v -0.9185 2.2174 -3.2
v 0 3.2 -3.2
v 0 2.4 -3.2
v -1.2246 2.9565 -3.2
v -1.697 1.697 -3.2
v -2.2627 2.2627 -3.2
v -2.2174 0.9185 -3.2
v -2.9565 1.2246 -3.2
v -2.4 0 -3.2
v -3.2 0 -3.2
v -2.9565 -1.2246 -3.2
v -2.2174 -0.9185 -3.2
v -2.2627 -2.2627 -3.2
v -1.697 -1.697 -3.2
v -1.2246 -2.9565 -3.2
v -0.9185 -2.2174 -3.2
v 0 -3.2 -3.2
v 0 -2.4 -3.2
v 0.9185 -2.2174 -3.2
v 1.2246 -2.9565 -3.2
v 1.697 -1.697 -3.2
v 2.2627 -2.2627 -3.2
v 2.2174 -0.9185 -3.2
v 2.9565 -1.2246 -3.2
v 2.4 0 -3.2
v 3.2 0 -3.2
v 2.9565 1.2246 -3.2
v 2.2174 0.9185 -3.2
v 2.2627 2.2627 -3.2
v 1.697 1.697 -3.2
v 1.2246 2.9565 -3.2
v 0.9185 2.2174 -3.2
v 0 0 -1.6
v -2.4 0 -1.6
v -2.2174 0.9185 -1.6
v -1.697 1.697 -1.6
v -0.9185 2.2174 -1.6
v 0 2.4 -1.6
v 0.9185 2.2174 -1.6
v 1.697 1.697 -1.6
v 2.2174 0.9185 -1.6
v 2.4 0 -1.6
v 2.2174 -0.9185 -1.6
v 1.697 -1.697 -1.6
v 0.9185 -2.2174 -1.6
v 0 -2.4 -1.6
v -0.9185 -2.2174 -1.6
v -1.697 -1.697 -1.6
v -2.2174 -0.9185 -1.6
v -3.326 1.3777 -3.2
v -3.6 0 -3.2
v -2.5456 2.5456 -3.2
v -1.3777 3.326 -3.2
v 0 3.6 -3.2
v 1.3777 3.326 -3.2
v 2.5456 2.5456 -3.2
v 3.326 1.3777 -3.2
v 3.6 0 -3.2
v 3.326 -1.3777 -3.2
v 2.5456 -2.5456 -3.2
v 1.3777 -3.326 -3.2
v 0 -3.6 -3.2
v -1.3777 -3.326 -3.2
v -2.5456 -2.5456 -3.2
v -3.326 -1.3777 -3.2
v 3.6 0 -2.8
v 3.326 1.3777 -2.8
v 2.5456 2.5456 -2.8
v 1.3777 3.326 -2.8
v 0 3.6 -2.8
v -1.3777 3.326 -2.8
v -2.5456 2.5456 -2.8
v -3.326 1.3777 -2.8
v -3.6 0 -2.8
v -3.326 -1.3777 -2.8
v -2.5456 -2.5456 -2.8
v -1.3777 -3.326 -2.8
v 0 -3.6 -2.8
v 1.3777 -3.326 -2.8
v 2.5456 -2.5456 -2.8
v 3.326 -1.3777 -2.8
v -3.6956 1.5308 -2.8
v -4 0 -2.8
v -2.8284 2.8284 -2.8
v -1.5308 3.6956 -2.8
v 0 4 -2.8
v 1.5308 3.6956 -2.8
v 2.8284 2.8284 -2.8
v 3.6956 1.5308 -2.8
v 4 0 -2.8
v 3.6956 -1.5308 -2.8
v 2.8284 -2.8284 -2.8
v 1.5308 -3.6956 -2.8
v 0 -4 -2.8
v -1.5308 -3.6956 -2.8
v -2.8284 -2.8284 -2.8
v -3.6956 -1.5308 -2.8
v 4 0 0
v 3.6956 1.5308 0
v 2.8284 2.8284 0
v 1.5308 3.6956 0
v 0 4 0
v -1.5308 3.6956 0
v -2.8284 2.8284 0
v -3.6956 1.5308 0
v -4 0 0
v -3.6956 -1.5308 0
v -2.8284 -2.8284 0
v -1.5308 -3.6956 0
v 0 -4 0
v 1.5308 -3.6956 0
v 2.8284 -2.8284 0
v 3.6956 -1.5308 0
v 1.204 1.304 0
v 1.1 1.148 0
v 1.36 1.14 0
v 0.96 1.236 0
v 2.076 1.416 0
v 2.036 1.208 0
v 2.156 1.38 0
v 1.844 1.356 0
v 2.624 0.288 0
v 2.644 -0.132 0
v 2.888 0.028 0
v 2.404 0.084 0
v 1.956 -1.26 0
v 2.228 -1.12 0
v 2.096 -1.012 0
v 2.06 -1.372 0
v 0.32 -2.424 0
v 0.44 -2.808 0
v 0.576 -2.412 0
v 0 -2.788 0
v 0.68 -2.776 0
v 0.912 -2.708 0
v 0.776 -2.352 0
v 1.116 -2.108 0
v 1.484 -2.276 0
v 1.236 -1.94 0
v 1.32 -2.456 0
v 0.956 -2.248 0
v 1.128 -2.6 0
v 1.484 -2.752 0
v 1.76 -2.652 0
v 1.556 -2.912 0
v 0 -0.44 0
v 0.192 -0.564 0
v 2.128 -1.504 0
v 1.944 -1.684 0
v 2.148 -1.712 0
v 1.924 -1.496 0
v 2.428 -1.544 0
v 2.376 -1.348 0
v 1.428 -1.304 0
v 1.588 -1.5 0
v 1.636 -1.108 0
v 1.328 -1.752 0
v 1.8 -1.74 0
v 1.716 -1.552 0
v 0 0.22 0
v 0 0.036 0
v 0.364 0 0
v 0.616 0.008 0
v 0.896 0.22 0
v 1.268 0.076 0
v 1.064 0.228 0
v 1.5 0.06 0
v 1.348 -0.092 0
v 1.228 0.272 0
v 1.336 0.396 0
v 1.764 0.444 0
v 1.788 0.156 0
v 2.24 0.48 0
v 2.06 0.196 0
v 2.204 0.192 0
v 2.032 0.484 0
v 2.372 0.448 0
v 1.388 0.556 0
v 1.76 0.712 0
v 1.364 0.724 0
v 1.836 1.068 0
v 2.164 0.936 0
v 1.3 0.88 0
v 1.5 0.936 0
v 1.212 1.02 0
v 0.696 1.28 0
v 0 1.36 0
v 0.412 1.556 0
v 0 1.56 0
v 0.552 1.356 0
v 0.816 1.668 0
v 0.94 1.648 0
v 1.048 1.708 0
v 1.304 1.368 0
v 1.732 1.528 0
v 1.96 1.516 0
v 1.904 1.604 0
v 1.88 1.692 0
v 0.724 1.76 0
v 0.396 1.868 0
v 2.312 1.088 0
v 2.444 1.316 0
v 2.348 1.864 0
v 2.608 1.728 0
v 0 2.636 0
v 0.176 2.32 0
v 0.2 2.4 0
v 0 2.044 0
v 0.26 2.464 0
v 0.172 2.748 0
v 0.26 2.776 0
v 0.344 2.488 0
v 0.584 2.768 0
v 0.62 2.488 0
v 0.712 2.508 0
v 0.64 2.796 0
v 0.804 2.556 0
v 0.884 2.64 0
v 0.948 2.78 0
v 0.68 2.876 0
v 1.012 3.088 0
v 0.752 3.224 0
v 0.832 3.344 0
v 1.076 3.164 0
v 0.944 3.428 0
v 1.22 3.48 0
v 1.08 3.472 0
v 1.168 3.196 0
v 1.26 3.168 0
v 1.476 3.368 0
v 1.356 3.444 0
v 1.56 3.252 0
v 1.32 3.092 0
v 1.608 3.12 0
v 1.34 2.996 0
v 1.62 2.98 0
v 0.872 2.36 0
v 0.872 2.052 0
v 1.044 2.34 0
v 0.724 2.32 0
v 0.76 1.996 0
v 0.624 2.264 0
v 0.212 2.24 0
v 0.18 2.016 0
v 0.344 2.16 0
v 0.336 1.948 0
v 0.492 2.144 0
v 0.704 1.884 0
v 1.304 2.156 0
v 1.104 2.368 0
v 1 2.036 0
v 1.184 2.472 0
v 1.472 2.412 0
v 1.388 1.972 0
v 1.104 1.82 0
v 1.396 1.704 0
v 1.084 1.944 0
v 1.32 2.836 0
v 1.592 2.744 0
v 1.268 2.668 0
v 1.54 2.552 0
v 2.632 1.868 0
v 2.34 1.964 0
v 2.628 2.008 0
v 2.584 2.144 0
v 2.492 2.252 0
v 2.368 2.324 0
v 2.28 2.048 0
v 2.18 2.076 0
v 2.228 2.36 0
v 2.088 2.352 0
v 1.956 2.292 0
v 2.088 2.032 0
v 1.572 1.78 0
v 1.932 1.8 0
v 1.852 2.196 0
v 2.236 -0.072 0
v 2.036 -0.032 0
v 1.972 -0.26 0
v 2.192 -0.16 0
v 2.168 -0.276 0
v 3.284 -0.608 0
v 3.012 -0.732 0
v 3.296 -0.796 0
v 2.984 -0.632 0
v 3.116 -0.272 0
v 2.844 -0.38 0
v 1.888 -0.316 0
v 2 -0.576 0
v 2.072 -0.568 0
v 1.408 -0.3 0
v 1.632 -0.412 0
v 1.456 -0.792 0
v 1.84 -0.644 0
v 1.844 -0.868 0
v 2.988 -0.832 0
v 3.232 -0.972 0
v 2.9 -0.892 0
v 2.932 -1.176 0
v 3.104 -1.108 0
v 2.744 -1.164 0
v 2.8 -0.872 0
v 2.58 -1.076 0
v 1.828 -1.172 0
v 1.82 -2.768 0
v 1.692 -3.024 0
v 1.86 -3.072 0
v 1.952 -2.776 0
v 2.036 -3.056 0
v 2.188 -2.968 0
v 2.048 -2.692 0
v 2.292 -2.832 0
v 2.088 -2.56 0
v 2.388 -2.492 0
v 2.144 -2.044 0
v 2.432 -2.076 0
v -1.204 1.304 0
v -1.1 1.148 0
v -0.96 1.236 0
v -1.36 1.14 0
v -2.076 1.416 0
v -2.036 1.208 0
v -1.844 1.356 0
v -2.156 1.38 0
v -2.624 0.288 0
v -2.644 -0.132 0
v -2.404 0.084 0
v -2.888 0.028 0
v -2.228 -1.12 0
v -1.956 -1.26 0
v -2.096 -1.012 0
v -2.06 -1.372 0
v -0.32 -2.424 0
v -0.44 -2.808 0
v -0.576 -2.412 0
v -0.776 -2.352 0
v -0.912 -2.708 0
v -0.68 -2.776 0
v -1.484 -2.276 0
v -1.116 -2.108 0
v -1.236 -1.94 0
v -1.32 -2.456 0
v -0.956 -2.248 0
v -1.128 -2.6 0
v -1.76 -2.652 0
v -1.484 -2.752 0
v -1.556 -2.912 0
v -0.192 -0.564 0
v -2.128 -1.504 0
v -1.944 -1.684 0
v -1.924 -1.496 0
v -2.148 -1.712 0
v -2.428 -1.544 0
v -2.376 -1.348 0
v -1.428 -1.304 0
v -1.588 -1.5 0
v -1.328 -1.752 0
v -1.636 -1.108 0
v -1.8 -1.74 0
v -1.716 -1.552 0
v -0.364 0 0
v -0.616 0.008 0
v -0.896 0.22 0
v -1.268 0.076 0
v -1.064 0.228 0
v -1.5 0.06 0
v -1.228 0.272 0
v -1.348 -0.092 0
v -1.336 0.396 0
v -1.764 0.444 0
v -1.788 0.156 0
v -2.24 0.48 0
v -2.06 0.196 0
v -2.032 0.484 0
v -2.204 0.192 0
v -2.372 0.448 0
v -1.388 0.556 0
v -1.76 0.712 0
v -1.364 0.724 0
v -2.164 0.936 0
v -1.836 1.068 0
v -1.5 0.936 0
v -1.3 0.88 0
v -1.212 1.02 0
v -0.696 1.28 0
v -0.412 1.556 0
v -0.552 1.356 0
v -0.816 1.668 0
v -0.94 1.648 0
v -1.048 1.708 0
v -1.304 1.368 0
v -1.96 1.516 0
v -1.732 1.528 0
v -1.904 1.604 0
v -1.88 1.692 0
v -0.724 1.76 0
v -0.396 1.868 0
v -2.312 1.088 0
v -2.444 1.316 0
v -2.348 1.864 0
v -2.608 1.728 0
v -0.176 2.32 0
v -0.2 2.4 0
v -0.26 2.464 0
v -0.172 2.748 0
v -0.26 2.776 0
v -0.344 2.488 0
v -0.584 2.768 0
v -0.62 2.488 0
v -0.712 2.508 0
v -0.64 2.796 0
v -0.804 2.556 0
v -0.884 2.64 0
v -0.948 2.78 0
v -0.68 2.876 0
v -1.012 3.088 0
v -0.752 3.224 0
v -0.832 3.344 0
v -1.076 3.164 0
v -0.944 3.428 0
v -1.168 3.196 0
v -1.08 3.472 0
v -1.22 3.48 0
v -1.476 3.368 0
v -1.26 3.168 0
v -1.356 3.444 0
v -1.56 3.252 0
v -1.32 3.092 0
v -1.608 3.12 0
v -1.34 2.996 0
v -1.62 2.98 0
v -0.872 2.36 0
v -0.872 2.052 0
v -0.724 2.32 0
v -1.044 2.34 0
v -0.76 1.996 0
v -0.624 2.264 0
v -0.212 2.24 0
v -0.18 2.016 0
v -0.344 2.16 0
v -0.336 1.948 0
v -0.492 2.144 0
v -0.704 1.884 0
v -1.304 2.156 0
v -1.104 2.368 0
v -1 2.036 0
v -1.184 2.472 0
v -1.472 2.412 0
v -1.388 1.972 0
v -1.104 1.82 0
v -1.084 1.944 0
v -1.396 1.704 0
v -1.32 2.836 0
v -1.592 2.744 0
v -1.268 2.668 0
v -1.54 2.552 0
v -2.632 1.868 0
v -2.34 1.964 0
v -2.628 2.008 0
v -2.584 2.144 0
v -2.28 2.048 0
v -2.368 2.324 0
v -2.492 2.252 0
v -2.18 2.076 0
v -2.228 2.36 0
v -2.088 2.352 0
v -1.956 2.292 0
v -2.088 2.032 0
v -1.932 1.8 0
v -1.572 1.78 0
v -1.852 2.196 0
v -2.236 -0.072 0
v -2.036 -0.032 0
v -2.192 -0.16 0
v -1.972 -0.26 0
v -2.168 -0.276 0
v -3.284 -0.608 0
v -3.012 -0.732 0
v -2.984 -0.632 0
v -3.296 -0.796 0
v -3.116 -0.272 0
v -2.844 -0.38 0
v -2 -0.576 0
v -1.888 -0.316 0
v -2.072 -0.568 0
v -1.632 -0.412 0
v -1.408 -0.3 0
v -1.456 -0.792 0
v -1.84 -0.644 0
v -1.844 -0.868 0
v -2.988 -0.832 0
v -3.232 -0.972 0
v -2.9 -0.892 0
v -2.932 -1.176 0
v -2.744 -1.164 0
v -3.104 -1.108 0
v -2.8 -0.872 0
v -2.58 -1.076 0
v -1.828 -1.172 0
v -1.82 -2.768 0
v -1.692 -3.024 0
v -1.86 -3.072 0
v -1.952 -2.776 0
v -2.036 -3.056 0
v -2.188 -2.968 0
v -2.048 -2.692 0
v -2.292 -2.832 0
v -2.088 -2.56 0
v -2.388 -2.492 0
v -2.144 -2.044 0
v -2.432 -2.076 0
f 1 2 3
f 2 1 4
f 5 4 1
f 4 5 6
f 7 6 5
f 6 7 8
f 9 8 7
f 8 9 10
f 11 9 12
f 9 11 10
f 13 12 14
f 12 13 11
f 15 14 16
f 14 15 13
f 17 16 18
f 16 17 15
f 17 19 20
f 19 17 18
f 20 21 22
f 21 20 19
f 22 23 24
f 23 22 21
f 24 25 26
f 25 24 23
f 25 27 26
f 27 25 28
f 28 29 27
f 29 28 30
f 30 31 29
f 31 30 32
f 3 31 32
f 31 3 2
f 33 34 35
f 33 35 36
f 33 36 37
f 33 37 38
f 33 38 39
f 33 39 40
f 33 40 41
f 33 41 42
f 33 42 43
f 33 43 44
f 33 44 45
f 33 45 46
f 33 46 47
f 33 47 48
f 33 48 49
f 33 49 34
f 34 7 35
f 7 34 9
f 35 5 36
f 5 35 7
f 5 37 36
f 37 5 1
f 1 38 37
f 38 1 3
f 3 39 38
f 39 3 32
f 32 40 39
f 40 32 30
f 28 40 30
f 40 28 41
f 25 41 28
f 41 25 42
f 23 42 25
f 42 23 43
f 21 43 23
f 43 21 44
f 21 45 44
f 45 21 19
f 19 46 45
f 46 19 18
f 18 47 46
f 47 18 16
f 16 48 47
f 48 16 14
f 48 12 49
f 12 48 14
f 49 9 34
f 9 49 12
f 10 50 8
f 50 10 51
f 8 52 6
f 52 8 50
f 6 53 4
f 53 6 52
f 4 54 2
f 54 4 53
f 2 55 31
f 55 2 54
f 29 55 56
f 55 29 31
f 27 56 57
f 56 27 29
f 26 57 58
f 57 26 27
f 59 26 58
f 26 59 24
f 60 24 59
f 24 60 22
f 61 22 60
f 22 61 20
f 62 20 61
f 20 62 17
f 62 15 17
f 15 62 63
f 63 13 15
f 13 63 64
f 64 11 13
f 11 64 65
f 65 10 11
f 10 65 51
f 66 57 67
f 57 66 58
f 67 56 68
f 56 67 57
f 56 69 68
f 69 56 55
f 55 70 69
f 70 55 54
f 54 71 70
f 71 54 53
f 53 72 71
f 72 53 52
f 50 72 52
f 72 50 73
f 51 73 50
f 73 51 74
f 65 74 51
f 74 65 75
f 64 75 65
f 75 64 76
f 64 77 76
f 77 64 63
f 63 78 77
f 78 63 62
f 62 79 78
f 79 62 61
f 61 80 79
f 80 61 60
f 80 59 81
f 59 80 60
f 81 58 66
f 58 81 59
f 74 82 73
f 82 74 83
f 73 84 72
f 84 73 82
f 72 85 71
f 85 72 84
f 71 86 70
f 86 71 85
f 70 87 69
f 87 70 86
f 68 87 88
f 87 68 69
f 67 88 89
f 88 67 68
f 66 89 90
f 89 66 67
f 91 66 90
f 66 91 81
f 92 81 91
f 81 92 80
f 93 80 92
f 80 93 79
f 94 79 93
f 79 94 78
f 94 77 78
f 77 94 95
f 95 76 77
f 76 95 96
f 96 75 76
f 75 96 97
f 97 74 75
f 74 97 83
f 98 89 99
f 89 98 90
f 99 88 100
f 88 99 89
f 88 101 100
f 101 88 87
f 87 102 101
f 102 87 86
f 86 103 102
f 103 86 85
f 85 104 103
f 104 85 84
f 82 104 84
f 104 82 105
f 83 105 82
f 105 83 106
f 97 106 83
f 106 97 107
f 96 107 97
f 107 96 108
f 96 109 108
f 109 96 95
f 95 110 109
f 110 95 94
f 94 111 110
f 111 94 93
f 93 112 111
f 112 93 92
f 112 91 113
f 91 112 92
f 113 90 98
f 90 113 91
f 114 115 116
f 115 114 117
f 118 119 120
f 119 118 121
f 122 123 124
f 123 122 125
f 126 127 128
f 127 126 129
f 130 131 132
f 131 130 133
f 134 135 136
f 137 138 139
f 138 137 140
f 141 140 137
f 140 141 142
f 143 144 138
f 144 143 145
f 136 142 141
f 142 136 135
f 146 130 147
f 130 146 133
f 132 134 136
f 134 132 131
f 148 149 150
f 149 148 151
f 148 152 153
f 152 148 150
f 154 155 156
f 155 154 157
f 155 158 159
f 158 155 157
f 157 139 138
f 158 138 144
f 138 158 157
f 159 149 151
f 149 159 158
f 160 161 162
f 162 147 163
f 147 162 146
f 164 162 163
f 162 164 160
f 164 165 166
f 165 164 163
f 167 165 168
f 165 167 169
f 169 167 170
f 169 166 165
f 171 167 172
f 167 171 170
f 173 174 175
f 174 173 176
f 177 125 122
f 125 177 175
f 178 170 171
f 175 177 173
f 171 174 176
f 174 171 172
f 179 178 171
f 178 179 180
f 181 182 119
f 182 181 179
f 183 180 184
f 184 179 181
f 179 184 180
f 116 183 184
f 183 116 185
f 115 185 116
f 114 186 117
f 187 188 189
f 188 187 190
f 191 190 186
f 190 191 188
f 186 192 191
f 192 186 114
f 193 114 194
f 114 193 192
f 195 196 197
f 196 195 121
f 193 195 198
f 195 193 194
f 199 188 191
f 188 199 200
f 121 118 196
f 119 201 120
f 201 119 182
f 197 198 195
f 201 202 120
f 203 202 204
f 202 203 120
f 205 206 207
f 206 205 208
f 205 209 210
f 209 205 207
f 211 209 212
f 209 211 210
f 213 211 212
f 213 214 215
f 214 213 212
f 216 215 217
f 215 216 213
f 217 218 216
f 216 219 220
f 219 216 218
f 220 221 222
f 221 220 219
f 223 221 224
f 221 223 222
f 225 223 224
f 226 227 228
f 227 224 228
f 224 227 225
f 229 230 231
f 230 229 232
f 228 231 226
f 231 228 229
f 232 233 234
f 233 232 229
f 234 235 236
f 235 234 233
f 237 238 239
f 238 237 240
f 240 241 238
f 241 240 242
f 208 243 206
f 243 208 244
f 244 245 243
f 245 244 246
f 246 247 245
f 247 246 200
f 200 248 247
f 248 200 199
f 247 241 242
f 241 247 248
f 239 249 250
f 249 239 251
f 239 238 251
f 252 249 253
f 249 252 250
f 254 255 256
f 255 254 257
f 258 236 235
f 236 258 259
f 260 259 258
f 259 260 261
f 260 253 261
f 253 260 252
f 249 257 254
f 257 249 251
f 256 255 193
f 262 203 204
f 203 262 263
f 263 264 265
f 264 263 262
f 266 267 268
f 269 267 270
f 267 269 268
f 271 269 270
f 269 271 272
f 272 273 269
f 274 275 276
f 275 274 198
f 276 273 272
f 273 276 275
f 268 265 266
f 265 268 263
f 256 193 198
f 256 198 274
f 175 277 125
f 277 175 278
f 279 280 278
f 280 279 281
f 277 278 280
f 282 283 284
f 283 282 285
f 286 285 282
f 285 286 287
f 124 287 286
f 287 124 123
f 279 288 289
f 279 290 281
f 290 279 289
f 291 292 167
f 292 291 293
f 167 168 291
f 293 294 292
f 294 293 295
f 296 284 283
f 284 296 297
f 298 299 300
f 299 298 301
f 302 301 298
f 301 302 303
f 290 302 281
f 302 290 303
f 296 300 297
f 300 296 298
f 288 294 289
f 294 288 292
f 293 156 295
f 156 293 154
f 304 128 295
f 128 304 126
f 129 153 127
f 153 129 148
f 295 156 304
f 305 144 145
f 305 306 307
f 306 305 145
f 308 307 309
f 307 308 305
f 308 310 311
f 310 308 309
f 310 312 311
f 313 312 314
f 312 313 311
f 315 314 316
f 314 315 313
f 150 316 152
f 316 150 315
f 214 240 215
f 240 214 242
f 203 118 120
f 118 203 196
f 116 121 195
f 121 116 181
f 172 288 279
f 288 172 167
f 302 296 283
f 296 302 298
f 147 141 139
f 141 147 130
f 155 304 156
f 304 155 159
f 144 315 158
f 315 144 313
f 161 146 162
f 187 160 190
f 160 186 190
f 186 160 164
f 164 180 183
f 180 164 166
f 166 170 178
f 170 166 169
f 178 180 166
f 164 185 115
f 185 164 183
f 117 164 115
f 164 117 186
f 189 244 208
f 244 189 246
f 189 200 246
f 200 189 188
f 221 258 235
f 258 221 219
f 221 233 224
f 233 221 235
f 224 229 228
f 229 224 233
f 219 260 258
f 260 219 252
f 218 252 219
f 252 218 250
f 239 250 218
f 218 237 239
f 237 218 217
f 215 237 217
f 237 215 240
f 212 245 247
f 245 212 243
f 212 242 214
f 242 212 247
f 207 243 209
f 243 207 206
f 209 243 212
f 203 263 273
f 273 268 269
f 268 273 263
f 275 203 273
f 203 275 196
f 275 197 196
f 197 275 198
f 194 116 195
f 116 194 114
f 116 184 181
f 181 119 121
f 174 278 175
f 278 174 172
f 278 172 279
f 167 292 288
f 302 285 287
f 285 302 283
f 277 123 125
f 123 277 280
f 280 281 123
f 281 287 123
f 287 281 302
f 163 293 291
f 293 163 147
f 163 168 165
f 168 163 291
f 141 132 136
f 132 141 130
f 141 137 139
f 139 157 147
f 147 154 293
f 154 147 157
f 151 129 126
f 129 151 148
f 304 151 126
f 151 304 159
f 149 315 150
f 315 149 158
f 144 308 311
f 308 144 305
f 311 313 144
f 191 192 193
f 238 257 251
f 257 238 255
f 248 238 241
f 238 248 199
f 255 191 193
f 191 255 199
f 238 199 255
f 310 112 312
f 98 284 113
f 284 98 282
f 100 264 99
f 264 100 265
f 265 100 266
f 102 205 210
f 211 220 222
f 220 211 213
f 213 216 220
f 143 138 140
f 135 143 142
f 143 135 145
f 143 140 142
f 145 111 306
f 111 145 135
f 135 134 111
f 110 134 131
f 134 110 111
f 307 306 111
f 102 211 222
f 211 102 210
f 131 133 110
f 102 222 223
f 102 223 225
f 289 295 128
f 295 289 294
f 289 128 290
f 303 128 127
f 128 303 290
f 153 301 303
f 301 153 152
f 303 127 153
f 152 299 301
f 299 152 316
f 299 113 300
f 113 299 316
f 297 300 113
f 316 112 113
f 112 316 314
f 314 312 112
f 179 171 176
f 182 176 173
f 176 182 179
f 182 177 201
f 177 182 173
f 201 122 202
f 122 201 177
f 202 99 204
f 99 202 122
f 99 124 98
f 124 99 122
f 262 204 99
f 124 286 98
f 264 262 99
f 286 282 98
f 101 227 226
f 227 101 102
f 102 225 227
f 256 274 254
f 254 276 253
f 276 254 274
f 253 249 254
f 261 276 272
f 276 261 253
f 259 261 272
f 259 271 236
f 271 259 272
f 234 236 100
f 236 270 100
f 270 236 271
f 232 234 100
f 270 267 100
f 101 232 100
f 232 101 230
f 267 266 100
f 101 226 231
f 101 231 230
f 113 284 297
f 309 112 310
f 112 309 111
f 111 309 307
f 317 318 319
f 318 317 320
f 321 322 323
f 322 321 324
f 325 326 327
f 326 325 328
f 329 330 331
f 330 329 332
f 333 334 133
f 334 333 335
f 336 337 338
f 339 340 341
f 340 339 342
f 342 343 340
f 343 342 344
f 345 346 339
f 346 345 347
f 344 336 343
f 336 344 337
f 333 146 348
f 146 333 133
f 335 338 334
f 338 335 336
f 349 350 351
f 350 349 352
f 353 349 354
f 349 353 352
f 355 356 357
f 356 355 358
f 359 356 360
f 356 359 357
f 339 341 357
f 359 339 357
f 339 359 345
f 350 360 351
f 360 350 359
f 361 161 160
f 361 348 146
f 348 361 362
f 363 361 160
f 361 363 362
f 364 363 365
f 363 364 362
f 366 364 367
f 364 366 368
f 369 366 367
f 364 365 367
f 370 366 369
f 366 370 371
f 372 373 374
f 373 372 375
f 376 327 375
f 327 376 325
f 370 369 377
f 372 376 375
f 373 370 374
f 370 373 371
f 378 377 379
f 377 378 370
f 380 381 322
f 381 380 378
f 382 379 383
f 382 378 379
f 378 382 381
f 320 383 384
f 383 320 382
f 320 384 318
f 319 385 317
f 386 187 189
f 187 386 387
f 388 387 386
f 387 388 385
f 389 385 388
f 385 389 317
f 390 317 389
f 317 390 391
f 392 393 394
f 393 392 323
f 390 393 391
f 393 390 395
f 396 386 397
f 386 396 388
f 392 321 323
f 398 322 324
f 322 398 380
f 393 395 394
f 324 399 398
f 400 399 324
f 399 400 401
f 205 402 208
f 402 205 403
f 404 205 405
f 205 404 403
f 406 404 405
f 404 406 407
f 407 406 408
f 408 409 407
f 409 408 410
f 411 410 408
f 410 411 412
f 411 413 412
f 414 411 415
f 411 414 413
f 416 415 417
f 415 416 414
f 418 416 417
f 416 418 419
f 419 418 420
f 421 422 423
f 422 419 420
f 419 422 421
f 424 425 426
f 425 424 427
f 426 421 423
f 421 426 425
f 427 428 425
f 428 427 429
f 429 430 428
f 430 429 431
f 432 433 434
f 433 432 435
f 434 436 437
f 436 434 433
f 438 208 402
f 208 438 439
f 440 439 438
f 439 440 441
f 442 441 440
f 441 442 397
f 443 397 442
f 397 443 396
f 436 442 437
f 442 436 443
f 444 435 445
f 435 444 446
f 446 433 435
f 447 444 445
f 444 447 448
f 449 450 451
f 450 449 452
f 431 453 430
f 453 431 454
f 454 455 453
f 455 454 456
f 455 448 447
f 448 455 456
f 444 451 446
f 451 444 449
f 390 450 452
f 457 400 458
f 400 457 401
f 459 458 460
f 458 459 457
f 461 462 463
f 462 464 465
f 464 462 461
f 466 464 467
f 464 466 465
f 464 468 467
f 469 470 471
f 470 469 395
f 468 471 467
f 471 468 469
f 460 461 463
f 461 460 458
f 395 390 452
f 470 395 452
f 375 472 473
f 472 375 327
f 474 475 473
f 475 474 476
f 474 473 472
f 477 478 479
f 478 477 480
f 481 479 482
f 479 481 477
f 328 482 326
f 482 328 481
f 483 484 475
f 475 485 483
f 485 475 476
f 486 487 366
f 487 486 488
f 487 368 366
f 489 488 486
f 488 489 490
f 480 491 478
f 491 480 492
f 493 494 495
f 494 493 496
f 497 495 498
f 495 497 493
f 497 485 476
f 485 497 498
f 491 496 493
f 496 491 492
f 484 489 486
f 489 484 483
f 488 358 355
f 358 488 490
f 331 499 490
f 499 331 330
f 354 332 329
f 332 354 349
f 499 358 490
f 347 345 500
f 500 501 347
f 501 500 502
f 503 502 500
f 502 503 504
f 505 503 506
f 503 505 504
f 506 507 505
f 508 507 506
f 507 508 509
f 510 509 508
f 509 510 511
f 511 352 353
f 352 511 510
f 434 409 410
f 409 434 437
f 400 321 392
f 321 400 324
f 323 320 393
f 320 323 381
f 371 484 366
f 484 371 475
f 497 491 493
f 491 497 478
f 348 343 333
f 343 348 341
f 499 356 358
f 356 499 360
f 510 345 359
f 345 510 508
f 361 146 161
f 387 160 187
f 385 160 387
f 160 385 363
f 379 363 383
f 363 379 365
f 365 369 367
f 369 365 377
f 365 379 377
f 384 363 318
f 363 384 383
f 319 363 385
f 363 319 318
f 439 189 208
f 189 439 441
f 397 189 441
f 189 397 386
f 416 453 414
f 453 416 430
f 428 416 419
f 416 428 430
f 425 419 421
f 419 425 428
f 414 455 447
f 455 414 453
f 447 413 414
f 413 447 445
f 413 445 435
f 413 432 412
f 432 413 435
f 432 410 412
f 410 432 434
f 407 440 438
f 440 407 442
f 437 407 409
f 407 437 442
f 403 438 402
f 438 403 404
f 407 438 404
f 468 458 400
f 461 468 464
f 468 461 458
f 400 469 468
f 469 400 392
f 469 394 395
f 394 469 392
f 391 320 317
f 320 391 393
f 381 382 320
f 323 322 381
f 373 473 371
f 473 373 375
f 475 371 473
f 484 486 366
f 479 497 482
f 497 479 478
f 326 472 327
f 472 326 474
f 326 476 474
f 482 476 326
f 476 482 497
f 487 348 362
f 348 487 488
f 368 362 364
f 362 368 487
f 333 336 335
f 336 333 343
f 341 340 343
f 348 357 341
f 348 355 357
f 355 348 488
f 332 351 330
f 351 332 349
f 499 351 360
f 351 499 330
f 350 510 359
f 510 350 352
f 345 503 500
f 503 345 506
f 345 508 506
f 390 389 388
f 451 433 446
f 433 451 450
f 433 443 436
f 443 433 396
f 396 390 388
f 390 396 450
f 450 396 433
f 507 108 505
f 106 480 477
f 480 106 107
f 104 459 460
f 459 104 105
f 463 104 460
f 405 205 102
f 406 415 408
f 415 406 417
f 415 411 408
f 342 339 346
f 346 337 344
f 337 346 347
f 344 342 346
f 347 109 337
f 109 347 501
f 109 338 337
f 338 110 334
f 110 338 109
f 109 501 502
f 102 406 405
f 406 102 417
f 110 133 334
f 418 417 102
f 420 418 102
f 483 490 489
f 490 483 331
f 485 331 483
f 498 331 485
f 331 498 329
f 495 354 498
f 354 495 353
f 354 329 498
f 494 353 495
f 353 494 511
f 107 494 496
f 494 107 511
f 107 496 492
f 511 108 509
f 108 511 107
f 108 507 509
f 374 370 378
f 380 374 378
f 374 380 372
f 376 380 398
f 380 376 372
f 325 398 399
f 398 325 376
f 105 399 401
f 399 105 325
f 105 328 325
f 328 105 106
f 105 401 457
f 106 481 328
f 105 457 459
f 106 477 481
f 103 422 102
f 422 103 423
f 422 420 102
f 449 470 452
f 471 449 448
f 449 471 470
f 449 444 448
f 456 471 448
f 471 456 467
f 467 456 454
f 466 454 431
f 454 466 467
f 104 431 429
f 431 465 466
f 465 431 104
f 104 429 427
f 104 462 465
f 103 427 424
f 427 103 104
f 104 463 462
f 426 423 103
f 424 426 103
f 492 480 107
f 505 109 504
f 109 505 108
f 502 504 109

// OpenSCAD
use <../lib.scad>
use <../p/4-4ering.scad>
use <s/98138p3cs01.scad>
use <s/98138s02.scad>
function ldraw_lib__98138p3c() = [
// 0 Tile  1 x  1 Round with Dark Turquoise Beetle Pattern
// 0 Name: 98138p3c.dat
// 0 Author: Philippe Hurbain [Philo]
// 0 !LDRAW_ORG Part UPDATE 2025-02
// 0 !LICENSE Licensed under CC BY 4.0 : see CAreadme.txt
// 
// 0 BFC CERTIFY CCW
  [0,"BFC","CERTIFY"],
  [0,"BFC","CCW"],
// 
// 0 !KEYWORDS Bricklink 98138pb428, Brickowl 273358, Insect
// 0 !KEYWORDS Rebrickable 98138pr0405, Set 10350, Set 21353, Set 42631, Set 42669
// 
// 0 !HISTORY 2025-02-27 [OrionP] Official Update 2025-02
// 
// 1 16 0 0 0 1 0 0 0 1 0 0 0 1 s\98138s02.dat
  [1,16,0,0,0,1,0,0,0,1,0,0,0,1, ldraw_lib__s__98138s02()],
// 1 16 0 0 0 10 0 0 0 1 0 0 0 10 4-4ering.dat
  [1,16,0,0,0,10,0,0,0,1,0,0,0,10, ldraw_lib__4_4ering()],
// 
// 1 16 0 0 0 1 0 0 0 1 0 0 0 1 s\98138p3cs01.dat
  [1,16,0,0,0,1,0,0,0,1,0,0,0,1, ldraw_lib__s__98138p3cs01()],
// 1 16 0 0 0 -1 0 0 0 1 0 0 0 1 s\98138p3cs01.dat
  [1,16,0,0,0,-1,0,0,0,1,0,0,0,1, ldraw_lib__s__98138p3cs01()],
];
module ldraw_lib__98138p3c(step=0, col=false, unit=2/5, alt=false, line=0.2, solid=!$preview)
    makepoly(ldraw_lib__98138p3c(), step=step, col=col, unit=unit, alt=alt, line=line, solid=solid);
ldraw_lib__98138p3c(line=0.2);
